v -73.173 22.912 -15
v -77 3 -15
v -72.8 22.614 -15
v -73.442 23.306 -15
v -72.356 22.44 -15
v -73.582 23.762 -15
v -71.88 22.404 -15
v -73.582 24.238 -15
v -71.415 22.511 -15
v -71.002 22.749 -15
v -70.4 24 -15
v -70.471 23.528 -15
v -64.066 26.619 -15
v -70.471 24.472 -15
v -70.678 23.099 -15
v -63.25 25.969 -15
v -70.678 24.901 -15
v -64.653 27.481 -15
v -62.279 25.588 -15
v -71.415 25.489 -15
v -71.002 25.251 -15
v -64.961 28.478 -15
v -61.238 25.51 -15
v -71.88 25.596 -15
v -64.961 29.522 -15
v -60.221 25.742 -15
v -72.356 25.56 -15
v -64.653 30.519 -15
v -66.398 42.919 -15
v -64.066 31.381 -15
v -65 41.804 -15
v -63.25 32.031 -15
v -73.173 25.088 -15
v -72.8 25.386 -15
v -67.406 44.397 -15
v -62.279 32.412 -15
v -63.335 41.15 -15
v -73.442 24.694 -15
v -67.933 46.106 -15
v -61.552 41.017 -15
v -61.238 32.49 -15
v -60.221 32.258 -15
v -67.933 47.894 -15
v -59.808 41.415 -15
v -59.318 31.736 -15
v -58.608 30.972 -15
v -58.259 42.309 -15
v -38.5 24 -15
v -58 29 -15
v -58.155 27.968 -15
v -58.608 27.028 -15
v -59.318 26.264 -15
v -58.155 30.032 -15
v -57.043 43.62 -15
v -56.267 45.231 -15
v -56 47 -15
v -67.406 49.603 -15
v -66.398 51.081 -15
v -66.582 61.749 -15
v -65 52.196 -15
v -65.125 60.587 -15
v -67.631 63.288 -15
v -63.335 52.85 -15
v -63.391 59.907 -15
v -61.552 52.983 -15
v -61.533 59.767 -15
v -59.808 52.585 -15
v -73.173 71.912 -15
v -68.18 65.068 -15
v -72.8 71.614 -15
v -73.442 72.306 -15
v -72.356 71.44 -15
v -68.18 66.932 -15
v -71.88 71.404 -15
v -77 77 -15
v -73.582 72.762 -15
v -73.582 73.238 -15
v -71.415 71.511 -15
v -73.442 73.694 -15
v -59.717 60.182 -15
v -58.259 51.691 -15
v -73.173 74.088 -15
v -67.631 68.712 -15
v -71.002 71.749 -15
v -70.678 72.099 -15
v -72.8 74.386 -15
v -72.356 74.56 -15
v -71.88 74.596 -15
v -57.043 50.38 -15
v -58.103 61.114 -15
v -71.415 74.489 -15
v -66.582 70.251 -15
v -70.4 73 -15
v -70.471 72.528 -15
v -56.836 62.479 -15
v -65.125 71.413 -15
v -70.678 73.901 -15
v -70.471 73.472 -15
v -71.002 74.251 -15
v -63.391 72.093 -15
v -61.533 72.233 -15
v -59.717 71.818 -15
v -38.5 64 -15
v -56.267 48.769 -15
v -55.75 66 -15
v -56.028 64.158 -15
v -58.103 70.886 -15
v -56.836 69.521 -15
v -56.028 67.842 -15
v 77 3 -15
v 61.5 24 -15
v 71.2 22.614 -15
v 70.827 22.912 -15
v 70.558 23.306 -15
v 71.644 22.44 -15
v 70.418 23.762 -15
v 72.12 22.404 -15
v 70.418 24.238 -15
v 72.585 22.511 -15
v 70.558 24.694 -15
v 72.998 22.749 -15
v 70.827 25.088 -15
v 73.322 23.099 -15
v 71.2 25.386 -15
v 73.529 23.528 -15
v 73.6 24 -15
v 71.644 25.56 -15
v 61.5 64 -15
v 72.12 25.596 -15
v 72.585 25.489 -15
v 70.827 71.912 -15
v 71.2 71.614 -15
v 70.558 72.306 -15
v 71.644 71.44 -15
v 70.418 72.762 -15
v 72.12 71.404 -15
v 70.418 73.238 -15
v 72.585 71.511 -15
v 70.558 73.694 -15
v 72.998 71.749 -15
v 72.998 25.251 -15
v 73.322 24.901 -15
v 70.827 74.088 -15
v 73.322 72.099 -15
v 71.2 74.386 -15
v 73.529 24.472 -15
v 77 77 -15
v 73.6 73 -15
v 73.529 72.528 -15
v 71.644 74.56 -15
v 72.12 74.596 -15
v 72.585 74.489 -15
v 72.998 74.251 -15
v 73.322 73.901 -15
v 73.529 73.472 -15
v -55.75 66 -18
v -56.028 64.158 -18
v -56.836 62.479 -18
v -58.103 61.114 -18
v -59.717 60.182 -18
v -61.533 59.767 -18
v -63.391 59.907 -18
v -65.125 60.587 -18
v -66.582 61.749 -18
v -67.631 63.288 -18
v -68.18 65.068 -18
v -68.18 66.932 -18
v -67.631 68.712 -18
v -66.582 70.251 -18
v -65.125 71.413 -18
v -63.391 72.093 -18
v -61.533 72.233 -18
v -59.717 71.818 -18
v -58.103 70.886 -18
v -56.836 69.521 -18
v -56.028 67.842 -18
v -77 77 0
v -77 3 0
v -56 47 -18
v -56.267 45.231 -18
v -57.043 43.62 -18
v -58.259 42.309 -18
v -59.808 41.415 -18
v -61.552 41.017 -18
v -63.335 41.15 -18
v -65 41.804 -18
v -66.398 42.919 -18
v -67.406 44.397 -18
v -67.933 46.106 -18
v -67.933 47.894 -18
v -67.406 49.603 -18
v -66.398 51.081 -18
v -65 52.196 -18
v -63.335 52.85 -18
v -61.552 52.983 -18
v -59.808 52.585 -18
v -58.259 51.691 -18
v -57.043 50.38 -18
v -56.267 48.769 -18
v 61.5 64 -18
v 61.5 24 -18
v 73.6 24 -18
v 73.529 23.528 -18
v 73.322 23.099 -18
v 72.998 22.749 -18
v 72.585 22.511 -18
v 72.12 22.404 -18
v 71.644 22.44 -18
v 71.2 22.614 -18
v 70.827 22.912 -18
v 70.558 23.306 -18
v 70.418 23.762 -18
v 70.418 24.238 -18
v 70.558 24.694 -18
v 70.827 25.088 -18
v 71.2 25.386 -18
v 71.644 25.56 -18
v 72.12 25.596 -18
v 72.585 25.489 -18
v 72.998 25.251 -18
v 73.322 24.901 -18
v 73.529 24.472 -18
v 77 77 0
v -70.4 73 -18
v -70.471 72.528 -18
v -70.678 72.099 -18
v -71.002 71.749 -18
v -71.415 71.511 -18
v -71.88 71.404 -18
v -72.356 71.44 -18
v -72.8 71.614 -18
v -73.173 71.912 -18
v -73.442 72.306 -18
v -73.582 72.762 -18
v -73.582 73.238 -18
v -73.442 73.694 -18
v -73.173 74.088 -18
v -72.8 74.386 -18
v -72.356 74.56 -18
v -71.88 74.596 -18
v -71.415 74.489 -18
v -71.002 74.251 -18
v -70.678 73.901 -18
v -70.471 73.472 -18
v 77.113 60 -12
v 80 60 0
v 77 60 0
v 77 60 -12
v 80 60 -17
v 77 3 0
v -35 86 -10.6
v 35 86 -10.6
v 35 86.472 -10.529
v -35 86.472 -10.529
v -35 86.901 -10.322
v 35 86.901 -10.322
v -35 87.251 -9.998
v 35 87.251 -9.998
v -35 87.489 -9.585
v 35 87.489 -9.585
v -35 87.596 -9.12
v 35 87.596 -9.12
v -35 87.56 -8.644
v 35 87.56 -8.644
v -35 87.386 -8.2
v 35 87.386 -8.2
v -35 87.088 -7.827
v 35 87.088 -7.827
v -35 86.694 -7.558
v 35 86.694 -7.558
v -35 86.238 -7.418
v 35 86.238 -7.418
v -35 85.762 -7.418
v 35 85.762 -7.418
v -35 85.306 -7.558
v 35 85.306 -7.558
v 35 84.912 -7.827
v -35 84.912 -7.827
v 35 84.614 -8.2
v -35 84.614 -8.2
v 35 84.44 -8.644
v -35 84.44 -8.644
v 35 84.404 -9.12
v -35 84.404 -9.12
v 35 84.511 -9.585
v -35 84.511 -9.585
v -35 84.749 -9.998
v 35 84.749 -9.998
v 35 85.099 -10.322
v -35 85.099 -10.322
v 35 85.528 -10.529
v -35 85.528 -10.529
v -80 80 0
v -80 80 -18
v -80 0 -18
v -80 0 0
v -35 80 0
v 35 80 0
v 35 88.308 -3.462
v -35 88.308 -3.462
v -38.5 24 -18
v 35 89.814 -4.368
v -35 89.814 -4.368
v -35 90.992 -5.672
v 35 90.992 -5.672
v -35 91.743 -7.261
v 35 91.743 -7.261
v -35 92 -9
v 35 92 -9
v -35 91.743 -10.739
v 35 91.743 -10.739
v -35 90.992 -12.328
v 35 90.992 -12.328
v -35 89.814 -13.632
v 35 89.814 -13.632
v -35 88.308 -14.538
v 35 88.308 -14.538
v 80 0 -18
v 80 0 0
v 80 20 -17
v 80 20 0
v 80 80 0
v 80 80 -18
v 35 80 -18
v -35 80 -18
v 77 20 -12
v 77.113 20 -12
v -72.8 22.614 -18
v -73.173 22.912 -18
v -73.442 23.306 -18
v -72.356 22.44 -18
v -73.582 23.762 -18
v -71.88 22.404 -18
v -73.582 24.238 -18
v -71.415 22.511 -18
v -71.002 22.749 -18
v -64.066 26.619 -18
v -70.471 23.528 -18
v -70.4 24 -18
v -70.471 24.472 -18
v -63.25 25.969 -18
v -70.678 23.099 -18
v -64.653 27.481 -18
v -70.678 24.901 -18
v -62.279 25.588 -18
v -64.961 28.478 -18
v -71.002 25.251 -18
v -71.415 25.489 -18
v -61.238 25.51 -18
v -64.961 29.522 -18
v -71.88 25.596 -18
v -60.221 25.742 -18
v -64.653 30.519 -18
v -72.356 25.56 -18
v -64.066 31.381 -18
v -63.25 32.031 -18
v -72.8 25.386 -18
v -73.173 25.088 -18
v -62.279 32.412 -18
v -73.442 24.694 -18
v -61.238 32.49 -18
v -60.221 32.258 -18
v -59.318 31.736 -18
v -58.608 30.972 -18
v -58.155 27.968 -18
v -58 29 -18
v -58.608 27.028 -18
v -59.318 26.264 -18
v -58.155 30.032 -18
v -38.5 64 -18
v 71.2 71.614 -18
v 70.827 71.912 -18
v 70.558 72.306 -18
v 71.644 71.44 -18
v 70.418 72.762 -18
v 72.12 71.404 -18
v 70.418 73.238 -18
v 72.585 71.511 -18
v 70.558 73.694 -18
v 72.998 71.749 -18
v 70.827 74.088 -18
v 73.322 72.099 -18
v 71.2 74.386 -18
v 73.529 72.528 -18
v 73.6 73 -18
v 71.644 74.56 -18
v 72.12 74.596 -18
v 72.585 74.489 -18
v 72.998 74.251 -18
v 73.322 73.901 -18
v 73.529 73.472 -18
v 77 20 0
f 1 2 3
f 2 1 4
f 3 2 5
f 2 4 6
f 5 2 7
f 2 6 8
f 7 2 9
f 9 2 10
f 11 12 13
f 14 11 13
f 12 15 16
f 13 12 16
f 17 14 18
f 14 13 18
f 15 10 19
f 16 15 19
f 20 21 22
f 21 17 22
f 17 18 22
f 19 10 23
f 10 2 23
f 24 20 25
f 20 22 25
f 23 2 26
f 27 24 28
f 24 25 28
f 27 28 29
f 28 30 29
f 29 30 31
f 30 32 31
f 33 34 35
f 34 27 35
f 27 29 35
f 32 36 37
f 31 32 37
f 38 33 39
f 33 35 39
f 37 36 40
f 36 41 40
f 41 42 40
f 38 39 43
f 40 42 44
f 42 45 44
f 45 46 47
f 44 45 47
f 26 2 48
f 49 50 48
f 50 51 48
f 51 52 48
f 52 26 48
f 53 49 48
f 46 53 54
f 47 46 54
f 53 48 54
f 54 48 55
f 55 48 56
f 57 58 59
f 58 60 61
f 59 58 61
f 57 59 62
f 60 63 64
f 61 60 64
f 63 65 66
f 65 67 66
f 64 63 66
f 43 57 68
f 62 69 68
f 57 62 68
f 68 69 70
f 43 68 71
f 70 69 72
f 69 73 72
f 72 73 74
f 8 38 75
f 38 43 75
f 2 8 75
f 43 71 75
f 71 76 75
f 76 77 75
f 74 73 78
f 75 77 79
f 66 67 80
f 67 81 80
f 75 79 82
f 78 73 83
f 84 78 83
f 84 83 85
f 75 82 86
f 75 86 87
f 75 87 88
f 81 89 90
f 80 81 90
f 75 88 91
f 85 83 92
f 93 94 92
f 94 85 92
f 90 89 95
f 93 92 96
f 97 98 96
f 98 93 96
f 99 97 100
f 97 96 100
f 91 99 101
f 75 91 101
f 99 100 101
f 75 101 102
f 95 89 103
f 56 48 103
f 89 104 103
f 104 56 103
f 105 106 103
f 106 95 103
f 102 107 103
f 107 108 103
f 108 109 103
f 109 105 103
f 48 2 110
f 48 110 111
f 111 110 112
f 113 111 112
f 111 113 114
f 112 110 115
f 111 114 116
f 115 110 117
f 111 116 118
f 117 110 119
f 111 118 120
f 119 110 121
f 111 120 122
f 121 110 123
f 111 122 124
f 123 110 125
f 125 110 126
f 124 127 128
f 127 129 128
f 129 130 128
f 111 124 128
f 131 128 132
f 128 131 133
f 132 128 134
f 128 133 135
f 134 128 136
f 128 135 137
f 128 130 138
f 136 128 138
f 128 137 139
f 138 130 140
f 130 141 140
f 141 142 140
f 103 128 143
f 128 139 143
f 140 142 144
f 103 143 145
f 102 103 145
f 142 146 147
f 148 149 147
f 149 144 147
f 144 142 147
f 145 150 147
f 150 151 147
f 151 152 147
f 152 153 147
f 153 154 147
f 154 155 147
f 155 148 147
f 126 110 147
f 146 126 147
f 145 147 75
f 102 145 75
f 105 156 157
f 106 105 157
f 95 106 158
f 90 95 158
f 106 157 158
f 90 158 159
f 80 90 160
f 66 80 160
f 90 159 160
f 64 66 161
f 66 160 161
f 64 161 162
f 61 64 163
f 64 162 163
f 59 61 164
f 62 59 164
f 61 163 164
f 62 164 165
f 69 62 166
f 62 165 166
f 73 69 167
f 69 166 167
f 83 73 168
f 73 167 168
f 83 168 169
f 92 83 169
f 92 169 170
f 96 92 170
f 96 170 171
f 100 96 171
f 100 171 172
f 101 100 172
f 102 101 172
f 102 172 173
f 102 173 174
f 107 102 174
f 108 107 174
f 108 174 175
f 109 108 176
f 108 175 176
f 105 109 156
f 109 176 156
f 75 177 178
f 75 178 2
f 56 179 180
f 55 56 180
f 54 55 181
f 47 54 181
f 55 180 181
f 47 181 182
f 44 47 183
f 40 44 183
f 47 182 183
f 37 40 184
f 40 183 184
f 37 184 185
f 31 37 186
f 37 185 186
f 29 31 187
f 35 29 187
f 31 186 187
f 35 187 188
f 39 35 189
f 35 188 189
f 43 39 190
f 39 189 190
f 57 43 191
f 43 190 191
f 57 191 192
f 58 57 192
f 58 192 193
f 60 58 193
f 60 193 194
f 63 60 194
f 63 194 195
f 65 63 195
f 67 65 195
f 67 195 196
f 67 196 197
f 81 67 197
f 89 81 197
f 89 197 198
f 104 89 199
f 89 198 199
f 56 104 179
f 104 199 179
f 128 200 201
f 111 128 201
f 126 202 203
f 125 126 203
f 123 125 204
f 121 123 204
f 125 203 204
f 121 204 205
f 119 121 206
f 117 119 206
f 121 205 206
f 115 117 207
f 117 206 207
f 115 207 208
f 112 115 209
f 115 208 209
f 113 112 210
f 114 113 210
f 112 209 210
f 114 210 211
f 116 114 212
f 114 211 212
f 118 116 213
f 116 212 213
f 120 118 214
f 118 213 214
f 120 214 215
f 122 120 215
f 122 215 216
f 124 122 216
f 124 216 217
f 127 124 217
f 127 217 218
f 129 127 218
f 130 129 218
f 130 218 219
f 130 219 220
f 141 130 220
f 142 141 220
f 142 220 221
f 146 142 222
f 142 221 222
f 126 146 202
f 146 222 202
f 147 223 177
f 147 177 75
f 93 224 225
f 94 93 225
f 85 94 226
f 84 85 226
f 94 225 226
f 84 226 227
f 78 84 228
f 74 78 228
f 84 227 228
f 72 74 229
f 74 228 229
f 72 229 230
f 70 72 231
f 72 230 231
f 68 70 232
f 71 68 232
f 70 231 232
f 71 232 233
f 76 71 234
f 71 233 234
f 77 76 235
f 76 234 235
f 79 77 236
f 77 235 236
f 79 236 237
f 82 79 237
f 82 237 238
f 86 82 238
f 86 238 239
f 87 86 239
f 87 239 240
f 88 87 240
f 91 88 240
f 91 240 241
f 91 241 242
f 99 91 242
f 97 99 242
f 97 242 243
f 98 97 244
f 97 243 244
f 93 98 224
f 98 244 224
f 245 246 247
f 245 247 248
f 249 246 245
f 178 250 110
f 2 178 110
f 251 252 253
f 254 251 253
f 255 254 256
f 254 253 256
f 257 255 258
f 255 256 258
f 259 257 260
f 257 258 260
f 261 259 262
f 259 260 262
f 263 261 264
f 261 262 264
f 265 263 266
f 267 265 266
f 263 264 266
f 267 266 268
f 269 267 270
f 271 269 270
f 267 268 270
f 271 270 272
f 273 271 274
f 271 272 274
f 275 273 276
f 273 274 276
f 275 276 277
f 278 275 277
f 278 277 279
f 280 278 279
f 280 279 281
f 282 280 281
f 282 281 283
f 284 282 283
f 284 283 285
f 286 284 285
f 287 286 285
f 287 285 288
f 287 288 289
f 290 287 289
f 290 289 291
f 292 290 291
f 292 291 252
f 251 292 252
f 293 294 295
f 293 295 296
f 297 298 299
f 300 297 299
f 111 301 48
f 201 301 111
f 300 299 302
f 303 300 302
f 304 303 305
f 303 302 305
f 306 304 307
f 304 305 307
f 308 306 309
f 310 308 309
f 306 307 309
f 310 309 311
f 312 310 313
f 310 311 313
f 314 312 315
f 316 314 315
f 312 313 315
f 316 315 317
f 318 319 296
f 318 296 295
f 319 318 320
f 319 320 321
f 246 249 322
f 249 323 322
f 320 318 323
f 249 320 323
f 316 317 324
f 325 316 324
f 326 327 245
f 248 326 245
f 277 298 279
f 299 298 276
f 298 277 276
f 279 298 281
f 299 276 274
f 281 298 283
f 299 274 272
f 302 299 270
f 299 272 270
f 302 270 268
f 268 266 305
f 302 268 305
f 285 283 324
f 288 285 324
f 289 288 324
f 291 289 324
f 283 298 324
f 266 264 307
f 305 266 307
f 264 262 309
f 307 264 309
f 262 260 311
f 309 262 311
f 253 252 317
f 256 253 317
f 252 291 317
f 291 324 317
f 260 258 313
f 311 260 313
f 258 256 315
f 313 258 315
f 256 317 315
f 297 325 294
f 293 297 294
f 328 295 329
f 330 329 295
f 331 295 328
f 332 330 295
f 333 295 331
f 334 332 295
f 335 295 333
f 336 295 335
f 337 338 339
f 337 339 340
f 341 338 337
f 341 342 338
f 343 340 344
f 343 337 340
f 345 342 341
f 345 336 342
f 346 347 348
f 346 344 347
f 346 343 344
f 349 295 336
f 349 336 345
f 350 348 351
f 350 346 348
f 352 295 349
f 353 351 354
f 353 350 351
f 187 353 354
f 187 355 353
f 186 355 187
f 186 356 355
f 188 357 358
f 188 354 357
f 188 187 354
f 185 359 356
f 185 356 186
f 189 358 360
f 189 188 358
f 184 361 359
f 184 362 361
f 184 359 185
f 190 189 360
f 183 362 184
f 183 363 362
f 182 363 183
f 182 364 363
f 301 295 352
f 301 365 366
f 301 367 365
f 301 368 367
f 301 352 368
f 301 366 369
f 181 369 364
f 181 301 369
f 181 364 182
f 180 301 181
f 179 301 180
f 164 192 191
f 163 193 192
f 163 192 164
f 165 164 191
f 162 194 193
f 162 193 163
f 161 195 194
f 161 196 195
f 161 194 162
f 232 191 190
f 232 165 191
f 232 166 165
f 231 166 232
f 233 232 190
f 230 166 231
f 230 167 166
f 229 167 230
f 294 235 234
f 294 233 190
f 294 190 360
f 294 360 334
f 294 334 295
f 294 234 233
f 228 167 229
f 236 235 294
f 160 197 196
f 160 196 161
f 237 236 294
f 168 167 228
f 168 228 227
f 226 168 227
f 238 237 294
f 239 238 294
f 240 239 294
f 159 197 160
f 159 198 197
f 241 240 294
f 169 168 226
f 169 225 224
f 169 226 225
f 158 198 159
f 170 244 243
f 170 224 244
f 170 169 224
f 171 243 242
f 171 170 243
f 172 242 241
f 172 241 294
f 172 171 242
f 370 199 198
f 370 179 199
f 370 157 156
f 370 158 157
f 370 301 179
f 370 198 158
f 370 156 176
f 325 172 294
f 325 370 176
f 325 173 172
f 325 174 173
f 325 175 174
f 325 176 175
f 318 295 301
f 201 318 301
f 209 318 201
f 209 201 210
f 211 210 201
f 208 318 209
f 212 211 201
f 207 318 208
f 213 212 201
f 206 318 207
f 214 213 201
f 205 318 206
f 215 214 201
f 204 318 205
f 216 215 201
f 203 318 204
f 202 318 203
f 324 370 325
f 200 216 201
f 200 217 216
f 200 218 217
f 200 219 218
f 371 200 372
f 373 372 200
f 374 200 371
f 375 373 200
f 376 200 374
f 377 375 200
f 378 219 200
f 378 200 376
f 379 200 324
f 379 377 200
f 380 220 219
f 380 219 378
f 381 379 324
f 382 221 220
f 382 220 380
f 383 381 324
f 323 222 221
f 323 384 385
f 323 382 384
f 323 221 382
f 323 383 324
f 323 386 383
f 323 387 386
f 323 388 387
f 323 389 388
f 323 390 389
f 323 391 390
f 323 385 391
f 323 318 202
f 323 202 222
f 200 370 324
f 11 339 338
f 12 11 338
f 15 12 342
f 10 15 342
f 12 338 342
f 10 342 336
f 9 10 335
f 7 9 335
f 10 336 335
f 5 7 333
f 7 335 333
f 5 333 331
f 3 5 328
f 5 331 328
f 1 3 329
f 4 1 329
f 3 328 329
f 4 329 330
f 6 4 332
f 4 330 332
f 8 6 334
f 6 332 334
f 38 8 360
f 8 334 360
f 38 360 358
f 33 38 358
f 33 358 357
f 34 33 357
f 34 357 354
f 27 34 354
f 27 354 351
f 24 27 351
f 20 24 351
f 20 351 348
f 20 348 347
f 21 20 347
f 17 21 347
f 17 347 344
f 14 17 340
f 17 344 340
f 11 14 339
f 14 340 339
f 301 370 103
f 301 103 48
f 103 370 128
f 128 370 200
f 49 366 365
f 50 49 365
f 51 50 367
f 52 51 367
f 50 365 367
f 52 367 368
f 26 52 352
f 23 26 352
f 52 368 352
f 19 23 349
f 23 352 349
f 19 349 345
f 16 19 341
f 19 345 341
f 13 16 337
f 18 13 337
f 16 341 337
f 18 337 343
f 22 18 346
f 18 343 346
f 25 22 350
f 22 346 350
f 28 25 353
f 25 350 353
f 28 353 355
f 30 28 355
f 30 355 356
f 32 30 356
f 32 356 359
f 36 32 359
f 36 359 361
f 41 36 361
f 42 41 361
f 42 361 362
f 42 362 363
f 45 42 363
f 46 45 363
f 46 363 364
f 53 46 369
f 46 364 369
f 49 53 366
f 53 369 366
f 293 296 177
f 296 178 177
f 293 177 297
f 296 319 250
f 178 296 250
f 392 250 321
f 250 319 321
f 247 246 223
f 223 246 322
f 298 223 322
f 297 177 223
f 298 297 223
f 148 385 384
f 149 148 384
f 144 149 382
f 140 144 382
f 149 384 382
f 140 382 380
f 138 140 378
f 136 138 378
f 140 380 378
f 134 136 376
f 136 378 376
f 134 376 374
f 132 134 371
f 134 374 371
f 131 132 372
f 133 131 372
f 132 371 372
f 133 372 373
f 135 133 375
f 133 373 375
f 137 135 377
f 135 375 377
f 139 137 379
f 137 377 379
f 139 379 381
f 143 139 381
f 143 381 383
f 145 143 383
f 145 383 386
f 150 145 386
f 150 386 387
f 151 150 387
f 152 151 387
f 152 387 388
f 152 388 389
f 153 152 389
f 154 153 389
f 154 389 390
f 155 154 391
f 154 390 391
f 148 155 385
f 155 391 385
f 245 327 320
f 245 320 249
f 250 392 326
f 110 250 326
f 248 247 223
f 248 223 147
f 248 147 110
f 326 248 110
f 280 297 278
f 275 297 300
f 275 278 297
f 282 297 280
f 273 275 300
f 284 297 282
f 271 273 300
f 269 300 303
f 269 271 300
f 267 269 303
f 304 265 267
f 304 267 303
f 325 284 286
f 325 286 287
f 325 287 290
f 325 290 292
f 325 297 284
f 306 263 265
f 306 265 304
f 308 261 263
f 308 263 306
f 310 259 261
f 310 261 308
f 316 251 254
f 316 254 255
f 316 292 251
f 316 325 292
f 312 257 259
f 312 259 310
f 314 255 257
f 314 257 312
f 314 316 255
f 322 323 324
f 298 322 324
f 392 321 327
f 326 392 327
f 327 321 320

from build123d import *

# Parameters (mm, degrees)
ESBO_O2_W                = 18
ESBO_O2_H                = 80
RESSALTO_EXTRUS_O1_DEPTH = 80
CASCA1_T                 = -3
ESBO_O4_R                = 1.6
ESBO_O4_R_2              = 6
ESBO_O4_R_3              = 3.5
ESBO_O4_R_4              = 6.25
ESBO_O4_W                = 100
ESBO_O4_H                = 40
CORTE_EXTRUS_O1_DEPTH    = 3
ESBO_O5_R                = 1.6
RESSALTO_EXTRUS_O2_DEPTH = 160
ESBO_O6_W                = 45
ESBO_O6_H                = 12
CORTE_EXTRUS_O2_DEPTH    = 19
ESBO_O7_W                = 12
ESBO_O7_H                = 40
CORTE_EXTRUS_O3_DEPTH    = 10
CHANFRO1_SIZE            = 5
CHANFRO1_SIZE2           = 2.886751346


with BuildPart() as part:
    # Esboço2 → Ressalto-extrusão1 (new body, symmetric)
    with BuildSketch(Plane(origin=(0, 0, 0), x_dir=(0, 0, -1), z_dir=(1, 0, 0))):
        with Locations((9, 40)):
            Rectangle(ESBO_O2_W, ESBO_O2_H)
    extrude(amount=RESSALTO_EXTRUS_O1_DEPTH, both=True)

    # Casca1
    casca1_openings = [part.faces().sort_by_distance(p)[0] for p in [
        (0, 40, 0),
    ]]
    offset(amount=CASCA1_T, openings=casca1_openings, kind=Kind.INTERSECTION)

    # Esboço4 → Corte-extrusão1 (cut)
    with BuildSketch(Plane(origin=(0, 0, -18), x_dir=(1, 0, 0), z_dir=(0, 0, -1))):
        with Locations((-72, -24)):
            Circle(ESBO_O4_R)
        with Locations((-72, -73)):
            Circle(ESBO_O4_R)
        with Locations((72, -73)):
            Circle(ESBO_O4_R)
        with Locations((72, -24)):
            Circle(ESBO_O4_R)
        with Locations((-62, -47)):
            Circle(ESBO_O4_R_2)
        with Locations((-61.5, -29)):
            Circle(ESBO_O4_R_3)
        with Locations((-62, -66)):
            Circle(ESBO_O4_R_4)
        with Locations((11.5, -44)):
            Rectangle(ESBO_O4_W, ESBO_O4_H)
    extrude(amount=-CORTE_EXTRUS_O1_DEPTH, mode=Mode.SUBTRACT)

    # Esboço5 → Ressalto-extrusão2 (add, through all)
    with BuildSketch(Plane(origin=(80, 0, 0), x_dir=(0, 0, -1), z_dir=(1, 0, 0))):
        with BuildLine():
            Line((14.538461538, 88.307692308), (18, 80))
            Line((18, 80), (0, 80))
            Line((0, 80), (3.461538462, 88.307692308))
            ThreePointArc((3.461538462, 88.307692308), (9, 92), (14.538461538, 88.307692308))
        make_face()
        with Locations((9, 86)):
            Circle(ESBO_O5_R, mode=Mode.SUBTRACT)
    extrude(amount=-RESSALTO_EXTRUS_O2_DEPTH)

    # Esboço6 → Corte-extrusão2 (cut, through all)
    with BuildSketch(Plane(origin=(0, 0, -18), x_dir=(-1, 0, 0), z_dir=(0, 0, -1))):
        with Locations((-57.5, 86)):
            Rectangle(ESBO_O6_W, ESBO_O6_H)
        with Locations((57.5, 86)):
            Rectangle(ESBO_O6_W, ESBO_O6_H)
    extrude(amount=-CORTE_EXTRUS_O2_DEPTH, mode=Mode.SUBTRACT)

    # Esboço7 → Corte-extrusão3 (cut)
    with BuildSketch(Plane(origin=(80, 0, 0), x_dir=(0, 0, -1), z_dir=(1, 0, 0))):
        with Locations((6, 40)):
            Rectangle(ESBO_O7_W, ESBO_O7_H)
    extrude(amount=-CORTE_EXTRUS_O3_DEPTH, mode=Mode.SUBTRACT)

    # Chanfro1
    chanfro1_edges = [part.edges().sort_by_distance(p)[0] for p in [
        (80, 40, -12),
    ]]
    chanfro1_side = [part.faces().sort_by_distance(p)[0] for p in [
        (80, 79.18, -9),
    ]]
    chamfer(chanfro1_edges, length=CHANFRO1_SIZE, length2=CHANFRO1_SIZE2, reference=chanfro1_side[0])


solid = part.part
